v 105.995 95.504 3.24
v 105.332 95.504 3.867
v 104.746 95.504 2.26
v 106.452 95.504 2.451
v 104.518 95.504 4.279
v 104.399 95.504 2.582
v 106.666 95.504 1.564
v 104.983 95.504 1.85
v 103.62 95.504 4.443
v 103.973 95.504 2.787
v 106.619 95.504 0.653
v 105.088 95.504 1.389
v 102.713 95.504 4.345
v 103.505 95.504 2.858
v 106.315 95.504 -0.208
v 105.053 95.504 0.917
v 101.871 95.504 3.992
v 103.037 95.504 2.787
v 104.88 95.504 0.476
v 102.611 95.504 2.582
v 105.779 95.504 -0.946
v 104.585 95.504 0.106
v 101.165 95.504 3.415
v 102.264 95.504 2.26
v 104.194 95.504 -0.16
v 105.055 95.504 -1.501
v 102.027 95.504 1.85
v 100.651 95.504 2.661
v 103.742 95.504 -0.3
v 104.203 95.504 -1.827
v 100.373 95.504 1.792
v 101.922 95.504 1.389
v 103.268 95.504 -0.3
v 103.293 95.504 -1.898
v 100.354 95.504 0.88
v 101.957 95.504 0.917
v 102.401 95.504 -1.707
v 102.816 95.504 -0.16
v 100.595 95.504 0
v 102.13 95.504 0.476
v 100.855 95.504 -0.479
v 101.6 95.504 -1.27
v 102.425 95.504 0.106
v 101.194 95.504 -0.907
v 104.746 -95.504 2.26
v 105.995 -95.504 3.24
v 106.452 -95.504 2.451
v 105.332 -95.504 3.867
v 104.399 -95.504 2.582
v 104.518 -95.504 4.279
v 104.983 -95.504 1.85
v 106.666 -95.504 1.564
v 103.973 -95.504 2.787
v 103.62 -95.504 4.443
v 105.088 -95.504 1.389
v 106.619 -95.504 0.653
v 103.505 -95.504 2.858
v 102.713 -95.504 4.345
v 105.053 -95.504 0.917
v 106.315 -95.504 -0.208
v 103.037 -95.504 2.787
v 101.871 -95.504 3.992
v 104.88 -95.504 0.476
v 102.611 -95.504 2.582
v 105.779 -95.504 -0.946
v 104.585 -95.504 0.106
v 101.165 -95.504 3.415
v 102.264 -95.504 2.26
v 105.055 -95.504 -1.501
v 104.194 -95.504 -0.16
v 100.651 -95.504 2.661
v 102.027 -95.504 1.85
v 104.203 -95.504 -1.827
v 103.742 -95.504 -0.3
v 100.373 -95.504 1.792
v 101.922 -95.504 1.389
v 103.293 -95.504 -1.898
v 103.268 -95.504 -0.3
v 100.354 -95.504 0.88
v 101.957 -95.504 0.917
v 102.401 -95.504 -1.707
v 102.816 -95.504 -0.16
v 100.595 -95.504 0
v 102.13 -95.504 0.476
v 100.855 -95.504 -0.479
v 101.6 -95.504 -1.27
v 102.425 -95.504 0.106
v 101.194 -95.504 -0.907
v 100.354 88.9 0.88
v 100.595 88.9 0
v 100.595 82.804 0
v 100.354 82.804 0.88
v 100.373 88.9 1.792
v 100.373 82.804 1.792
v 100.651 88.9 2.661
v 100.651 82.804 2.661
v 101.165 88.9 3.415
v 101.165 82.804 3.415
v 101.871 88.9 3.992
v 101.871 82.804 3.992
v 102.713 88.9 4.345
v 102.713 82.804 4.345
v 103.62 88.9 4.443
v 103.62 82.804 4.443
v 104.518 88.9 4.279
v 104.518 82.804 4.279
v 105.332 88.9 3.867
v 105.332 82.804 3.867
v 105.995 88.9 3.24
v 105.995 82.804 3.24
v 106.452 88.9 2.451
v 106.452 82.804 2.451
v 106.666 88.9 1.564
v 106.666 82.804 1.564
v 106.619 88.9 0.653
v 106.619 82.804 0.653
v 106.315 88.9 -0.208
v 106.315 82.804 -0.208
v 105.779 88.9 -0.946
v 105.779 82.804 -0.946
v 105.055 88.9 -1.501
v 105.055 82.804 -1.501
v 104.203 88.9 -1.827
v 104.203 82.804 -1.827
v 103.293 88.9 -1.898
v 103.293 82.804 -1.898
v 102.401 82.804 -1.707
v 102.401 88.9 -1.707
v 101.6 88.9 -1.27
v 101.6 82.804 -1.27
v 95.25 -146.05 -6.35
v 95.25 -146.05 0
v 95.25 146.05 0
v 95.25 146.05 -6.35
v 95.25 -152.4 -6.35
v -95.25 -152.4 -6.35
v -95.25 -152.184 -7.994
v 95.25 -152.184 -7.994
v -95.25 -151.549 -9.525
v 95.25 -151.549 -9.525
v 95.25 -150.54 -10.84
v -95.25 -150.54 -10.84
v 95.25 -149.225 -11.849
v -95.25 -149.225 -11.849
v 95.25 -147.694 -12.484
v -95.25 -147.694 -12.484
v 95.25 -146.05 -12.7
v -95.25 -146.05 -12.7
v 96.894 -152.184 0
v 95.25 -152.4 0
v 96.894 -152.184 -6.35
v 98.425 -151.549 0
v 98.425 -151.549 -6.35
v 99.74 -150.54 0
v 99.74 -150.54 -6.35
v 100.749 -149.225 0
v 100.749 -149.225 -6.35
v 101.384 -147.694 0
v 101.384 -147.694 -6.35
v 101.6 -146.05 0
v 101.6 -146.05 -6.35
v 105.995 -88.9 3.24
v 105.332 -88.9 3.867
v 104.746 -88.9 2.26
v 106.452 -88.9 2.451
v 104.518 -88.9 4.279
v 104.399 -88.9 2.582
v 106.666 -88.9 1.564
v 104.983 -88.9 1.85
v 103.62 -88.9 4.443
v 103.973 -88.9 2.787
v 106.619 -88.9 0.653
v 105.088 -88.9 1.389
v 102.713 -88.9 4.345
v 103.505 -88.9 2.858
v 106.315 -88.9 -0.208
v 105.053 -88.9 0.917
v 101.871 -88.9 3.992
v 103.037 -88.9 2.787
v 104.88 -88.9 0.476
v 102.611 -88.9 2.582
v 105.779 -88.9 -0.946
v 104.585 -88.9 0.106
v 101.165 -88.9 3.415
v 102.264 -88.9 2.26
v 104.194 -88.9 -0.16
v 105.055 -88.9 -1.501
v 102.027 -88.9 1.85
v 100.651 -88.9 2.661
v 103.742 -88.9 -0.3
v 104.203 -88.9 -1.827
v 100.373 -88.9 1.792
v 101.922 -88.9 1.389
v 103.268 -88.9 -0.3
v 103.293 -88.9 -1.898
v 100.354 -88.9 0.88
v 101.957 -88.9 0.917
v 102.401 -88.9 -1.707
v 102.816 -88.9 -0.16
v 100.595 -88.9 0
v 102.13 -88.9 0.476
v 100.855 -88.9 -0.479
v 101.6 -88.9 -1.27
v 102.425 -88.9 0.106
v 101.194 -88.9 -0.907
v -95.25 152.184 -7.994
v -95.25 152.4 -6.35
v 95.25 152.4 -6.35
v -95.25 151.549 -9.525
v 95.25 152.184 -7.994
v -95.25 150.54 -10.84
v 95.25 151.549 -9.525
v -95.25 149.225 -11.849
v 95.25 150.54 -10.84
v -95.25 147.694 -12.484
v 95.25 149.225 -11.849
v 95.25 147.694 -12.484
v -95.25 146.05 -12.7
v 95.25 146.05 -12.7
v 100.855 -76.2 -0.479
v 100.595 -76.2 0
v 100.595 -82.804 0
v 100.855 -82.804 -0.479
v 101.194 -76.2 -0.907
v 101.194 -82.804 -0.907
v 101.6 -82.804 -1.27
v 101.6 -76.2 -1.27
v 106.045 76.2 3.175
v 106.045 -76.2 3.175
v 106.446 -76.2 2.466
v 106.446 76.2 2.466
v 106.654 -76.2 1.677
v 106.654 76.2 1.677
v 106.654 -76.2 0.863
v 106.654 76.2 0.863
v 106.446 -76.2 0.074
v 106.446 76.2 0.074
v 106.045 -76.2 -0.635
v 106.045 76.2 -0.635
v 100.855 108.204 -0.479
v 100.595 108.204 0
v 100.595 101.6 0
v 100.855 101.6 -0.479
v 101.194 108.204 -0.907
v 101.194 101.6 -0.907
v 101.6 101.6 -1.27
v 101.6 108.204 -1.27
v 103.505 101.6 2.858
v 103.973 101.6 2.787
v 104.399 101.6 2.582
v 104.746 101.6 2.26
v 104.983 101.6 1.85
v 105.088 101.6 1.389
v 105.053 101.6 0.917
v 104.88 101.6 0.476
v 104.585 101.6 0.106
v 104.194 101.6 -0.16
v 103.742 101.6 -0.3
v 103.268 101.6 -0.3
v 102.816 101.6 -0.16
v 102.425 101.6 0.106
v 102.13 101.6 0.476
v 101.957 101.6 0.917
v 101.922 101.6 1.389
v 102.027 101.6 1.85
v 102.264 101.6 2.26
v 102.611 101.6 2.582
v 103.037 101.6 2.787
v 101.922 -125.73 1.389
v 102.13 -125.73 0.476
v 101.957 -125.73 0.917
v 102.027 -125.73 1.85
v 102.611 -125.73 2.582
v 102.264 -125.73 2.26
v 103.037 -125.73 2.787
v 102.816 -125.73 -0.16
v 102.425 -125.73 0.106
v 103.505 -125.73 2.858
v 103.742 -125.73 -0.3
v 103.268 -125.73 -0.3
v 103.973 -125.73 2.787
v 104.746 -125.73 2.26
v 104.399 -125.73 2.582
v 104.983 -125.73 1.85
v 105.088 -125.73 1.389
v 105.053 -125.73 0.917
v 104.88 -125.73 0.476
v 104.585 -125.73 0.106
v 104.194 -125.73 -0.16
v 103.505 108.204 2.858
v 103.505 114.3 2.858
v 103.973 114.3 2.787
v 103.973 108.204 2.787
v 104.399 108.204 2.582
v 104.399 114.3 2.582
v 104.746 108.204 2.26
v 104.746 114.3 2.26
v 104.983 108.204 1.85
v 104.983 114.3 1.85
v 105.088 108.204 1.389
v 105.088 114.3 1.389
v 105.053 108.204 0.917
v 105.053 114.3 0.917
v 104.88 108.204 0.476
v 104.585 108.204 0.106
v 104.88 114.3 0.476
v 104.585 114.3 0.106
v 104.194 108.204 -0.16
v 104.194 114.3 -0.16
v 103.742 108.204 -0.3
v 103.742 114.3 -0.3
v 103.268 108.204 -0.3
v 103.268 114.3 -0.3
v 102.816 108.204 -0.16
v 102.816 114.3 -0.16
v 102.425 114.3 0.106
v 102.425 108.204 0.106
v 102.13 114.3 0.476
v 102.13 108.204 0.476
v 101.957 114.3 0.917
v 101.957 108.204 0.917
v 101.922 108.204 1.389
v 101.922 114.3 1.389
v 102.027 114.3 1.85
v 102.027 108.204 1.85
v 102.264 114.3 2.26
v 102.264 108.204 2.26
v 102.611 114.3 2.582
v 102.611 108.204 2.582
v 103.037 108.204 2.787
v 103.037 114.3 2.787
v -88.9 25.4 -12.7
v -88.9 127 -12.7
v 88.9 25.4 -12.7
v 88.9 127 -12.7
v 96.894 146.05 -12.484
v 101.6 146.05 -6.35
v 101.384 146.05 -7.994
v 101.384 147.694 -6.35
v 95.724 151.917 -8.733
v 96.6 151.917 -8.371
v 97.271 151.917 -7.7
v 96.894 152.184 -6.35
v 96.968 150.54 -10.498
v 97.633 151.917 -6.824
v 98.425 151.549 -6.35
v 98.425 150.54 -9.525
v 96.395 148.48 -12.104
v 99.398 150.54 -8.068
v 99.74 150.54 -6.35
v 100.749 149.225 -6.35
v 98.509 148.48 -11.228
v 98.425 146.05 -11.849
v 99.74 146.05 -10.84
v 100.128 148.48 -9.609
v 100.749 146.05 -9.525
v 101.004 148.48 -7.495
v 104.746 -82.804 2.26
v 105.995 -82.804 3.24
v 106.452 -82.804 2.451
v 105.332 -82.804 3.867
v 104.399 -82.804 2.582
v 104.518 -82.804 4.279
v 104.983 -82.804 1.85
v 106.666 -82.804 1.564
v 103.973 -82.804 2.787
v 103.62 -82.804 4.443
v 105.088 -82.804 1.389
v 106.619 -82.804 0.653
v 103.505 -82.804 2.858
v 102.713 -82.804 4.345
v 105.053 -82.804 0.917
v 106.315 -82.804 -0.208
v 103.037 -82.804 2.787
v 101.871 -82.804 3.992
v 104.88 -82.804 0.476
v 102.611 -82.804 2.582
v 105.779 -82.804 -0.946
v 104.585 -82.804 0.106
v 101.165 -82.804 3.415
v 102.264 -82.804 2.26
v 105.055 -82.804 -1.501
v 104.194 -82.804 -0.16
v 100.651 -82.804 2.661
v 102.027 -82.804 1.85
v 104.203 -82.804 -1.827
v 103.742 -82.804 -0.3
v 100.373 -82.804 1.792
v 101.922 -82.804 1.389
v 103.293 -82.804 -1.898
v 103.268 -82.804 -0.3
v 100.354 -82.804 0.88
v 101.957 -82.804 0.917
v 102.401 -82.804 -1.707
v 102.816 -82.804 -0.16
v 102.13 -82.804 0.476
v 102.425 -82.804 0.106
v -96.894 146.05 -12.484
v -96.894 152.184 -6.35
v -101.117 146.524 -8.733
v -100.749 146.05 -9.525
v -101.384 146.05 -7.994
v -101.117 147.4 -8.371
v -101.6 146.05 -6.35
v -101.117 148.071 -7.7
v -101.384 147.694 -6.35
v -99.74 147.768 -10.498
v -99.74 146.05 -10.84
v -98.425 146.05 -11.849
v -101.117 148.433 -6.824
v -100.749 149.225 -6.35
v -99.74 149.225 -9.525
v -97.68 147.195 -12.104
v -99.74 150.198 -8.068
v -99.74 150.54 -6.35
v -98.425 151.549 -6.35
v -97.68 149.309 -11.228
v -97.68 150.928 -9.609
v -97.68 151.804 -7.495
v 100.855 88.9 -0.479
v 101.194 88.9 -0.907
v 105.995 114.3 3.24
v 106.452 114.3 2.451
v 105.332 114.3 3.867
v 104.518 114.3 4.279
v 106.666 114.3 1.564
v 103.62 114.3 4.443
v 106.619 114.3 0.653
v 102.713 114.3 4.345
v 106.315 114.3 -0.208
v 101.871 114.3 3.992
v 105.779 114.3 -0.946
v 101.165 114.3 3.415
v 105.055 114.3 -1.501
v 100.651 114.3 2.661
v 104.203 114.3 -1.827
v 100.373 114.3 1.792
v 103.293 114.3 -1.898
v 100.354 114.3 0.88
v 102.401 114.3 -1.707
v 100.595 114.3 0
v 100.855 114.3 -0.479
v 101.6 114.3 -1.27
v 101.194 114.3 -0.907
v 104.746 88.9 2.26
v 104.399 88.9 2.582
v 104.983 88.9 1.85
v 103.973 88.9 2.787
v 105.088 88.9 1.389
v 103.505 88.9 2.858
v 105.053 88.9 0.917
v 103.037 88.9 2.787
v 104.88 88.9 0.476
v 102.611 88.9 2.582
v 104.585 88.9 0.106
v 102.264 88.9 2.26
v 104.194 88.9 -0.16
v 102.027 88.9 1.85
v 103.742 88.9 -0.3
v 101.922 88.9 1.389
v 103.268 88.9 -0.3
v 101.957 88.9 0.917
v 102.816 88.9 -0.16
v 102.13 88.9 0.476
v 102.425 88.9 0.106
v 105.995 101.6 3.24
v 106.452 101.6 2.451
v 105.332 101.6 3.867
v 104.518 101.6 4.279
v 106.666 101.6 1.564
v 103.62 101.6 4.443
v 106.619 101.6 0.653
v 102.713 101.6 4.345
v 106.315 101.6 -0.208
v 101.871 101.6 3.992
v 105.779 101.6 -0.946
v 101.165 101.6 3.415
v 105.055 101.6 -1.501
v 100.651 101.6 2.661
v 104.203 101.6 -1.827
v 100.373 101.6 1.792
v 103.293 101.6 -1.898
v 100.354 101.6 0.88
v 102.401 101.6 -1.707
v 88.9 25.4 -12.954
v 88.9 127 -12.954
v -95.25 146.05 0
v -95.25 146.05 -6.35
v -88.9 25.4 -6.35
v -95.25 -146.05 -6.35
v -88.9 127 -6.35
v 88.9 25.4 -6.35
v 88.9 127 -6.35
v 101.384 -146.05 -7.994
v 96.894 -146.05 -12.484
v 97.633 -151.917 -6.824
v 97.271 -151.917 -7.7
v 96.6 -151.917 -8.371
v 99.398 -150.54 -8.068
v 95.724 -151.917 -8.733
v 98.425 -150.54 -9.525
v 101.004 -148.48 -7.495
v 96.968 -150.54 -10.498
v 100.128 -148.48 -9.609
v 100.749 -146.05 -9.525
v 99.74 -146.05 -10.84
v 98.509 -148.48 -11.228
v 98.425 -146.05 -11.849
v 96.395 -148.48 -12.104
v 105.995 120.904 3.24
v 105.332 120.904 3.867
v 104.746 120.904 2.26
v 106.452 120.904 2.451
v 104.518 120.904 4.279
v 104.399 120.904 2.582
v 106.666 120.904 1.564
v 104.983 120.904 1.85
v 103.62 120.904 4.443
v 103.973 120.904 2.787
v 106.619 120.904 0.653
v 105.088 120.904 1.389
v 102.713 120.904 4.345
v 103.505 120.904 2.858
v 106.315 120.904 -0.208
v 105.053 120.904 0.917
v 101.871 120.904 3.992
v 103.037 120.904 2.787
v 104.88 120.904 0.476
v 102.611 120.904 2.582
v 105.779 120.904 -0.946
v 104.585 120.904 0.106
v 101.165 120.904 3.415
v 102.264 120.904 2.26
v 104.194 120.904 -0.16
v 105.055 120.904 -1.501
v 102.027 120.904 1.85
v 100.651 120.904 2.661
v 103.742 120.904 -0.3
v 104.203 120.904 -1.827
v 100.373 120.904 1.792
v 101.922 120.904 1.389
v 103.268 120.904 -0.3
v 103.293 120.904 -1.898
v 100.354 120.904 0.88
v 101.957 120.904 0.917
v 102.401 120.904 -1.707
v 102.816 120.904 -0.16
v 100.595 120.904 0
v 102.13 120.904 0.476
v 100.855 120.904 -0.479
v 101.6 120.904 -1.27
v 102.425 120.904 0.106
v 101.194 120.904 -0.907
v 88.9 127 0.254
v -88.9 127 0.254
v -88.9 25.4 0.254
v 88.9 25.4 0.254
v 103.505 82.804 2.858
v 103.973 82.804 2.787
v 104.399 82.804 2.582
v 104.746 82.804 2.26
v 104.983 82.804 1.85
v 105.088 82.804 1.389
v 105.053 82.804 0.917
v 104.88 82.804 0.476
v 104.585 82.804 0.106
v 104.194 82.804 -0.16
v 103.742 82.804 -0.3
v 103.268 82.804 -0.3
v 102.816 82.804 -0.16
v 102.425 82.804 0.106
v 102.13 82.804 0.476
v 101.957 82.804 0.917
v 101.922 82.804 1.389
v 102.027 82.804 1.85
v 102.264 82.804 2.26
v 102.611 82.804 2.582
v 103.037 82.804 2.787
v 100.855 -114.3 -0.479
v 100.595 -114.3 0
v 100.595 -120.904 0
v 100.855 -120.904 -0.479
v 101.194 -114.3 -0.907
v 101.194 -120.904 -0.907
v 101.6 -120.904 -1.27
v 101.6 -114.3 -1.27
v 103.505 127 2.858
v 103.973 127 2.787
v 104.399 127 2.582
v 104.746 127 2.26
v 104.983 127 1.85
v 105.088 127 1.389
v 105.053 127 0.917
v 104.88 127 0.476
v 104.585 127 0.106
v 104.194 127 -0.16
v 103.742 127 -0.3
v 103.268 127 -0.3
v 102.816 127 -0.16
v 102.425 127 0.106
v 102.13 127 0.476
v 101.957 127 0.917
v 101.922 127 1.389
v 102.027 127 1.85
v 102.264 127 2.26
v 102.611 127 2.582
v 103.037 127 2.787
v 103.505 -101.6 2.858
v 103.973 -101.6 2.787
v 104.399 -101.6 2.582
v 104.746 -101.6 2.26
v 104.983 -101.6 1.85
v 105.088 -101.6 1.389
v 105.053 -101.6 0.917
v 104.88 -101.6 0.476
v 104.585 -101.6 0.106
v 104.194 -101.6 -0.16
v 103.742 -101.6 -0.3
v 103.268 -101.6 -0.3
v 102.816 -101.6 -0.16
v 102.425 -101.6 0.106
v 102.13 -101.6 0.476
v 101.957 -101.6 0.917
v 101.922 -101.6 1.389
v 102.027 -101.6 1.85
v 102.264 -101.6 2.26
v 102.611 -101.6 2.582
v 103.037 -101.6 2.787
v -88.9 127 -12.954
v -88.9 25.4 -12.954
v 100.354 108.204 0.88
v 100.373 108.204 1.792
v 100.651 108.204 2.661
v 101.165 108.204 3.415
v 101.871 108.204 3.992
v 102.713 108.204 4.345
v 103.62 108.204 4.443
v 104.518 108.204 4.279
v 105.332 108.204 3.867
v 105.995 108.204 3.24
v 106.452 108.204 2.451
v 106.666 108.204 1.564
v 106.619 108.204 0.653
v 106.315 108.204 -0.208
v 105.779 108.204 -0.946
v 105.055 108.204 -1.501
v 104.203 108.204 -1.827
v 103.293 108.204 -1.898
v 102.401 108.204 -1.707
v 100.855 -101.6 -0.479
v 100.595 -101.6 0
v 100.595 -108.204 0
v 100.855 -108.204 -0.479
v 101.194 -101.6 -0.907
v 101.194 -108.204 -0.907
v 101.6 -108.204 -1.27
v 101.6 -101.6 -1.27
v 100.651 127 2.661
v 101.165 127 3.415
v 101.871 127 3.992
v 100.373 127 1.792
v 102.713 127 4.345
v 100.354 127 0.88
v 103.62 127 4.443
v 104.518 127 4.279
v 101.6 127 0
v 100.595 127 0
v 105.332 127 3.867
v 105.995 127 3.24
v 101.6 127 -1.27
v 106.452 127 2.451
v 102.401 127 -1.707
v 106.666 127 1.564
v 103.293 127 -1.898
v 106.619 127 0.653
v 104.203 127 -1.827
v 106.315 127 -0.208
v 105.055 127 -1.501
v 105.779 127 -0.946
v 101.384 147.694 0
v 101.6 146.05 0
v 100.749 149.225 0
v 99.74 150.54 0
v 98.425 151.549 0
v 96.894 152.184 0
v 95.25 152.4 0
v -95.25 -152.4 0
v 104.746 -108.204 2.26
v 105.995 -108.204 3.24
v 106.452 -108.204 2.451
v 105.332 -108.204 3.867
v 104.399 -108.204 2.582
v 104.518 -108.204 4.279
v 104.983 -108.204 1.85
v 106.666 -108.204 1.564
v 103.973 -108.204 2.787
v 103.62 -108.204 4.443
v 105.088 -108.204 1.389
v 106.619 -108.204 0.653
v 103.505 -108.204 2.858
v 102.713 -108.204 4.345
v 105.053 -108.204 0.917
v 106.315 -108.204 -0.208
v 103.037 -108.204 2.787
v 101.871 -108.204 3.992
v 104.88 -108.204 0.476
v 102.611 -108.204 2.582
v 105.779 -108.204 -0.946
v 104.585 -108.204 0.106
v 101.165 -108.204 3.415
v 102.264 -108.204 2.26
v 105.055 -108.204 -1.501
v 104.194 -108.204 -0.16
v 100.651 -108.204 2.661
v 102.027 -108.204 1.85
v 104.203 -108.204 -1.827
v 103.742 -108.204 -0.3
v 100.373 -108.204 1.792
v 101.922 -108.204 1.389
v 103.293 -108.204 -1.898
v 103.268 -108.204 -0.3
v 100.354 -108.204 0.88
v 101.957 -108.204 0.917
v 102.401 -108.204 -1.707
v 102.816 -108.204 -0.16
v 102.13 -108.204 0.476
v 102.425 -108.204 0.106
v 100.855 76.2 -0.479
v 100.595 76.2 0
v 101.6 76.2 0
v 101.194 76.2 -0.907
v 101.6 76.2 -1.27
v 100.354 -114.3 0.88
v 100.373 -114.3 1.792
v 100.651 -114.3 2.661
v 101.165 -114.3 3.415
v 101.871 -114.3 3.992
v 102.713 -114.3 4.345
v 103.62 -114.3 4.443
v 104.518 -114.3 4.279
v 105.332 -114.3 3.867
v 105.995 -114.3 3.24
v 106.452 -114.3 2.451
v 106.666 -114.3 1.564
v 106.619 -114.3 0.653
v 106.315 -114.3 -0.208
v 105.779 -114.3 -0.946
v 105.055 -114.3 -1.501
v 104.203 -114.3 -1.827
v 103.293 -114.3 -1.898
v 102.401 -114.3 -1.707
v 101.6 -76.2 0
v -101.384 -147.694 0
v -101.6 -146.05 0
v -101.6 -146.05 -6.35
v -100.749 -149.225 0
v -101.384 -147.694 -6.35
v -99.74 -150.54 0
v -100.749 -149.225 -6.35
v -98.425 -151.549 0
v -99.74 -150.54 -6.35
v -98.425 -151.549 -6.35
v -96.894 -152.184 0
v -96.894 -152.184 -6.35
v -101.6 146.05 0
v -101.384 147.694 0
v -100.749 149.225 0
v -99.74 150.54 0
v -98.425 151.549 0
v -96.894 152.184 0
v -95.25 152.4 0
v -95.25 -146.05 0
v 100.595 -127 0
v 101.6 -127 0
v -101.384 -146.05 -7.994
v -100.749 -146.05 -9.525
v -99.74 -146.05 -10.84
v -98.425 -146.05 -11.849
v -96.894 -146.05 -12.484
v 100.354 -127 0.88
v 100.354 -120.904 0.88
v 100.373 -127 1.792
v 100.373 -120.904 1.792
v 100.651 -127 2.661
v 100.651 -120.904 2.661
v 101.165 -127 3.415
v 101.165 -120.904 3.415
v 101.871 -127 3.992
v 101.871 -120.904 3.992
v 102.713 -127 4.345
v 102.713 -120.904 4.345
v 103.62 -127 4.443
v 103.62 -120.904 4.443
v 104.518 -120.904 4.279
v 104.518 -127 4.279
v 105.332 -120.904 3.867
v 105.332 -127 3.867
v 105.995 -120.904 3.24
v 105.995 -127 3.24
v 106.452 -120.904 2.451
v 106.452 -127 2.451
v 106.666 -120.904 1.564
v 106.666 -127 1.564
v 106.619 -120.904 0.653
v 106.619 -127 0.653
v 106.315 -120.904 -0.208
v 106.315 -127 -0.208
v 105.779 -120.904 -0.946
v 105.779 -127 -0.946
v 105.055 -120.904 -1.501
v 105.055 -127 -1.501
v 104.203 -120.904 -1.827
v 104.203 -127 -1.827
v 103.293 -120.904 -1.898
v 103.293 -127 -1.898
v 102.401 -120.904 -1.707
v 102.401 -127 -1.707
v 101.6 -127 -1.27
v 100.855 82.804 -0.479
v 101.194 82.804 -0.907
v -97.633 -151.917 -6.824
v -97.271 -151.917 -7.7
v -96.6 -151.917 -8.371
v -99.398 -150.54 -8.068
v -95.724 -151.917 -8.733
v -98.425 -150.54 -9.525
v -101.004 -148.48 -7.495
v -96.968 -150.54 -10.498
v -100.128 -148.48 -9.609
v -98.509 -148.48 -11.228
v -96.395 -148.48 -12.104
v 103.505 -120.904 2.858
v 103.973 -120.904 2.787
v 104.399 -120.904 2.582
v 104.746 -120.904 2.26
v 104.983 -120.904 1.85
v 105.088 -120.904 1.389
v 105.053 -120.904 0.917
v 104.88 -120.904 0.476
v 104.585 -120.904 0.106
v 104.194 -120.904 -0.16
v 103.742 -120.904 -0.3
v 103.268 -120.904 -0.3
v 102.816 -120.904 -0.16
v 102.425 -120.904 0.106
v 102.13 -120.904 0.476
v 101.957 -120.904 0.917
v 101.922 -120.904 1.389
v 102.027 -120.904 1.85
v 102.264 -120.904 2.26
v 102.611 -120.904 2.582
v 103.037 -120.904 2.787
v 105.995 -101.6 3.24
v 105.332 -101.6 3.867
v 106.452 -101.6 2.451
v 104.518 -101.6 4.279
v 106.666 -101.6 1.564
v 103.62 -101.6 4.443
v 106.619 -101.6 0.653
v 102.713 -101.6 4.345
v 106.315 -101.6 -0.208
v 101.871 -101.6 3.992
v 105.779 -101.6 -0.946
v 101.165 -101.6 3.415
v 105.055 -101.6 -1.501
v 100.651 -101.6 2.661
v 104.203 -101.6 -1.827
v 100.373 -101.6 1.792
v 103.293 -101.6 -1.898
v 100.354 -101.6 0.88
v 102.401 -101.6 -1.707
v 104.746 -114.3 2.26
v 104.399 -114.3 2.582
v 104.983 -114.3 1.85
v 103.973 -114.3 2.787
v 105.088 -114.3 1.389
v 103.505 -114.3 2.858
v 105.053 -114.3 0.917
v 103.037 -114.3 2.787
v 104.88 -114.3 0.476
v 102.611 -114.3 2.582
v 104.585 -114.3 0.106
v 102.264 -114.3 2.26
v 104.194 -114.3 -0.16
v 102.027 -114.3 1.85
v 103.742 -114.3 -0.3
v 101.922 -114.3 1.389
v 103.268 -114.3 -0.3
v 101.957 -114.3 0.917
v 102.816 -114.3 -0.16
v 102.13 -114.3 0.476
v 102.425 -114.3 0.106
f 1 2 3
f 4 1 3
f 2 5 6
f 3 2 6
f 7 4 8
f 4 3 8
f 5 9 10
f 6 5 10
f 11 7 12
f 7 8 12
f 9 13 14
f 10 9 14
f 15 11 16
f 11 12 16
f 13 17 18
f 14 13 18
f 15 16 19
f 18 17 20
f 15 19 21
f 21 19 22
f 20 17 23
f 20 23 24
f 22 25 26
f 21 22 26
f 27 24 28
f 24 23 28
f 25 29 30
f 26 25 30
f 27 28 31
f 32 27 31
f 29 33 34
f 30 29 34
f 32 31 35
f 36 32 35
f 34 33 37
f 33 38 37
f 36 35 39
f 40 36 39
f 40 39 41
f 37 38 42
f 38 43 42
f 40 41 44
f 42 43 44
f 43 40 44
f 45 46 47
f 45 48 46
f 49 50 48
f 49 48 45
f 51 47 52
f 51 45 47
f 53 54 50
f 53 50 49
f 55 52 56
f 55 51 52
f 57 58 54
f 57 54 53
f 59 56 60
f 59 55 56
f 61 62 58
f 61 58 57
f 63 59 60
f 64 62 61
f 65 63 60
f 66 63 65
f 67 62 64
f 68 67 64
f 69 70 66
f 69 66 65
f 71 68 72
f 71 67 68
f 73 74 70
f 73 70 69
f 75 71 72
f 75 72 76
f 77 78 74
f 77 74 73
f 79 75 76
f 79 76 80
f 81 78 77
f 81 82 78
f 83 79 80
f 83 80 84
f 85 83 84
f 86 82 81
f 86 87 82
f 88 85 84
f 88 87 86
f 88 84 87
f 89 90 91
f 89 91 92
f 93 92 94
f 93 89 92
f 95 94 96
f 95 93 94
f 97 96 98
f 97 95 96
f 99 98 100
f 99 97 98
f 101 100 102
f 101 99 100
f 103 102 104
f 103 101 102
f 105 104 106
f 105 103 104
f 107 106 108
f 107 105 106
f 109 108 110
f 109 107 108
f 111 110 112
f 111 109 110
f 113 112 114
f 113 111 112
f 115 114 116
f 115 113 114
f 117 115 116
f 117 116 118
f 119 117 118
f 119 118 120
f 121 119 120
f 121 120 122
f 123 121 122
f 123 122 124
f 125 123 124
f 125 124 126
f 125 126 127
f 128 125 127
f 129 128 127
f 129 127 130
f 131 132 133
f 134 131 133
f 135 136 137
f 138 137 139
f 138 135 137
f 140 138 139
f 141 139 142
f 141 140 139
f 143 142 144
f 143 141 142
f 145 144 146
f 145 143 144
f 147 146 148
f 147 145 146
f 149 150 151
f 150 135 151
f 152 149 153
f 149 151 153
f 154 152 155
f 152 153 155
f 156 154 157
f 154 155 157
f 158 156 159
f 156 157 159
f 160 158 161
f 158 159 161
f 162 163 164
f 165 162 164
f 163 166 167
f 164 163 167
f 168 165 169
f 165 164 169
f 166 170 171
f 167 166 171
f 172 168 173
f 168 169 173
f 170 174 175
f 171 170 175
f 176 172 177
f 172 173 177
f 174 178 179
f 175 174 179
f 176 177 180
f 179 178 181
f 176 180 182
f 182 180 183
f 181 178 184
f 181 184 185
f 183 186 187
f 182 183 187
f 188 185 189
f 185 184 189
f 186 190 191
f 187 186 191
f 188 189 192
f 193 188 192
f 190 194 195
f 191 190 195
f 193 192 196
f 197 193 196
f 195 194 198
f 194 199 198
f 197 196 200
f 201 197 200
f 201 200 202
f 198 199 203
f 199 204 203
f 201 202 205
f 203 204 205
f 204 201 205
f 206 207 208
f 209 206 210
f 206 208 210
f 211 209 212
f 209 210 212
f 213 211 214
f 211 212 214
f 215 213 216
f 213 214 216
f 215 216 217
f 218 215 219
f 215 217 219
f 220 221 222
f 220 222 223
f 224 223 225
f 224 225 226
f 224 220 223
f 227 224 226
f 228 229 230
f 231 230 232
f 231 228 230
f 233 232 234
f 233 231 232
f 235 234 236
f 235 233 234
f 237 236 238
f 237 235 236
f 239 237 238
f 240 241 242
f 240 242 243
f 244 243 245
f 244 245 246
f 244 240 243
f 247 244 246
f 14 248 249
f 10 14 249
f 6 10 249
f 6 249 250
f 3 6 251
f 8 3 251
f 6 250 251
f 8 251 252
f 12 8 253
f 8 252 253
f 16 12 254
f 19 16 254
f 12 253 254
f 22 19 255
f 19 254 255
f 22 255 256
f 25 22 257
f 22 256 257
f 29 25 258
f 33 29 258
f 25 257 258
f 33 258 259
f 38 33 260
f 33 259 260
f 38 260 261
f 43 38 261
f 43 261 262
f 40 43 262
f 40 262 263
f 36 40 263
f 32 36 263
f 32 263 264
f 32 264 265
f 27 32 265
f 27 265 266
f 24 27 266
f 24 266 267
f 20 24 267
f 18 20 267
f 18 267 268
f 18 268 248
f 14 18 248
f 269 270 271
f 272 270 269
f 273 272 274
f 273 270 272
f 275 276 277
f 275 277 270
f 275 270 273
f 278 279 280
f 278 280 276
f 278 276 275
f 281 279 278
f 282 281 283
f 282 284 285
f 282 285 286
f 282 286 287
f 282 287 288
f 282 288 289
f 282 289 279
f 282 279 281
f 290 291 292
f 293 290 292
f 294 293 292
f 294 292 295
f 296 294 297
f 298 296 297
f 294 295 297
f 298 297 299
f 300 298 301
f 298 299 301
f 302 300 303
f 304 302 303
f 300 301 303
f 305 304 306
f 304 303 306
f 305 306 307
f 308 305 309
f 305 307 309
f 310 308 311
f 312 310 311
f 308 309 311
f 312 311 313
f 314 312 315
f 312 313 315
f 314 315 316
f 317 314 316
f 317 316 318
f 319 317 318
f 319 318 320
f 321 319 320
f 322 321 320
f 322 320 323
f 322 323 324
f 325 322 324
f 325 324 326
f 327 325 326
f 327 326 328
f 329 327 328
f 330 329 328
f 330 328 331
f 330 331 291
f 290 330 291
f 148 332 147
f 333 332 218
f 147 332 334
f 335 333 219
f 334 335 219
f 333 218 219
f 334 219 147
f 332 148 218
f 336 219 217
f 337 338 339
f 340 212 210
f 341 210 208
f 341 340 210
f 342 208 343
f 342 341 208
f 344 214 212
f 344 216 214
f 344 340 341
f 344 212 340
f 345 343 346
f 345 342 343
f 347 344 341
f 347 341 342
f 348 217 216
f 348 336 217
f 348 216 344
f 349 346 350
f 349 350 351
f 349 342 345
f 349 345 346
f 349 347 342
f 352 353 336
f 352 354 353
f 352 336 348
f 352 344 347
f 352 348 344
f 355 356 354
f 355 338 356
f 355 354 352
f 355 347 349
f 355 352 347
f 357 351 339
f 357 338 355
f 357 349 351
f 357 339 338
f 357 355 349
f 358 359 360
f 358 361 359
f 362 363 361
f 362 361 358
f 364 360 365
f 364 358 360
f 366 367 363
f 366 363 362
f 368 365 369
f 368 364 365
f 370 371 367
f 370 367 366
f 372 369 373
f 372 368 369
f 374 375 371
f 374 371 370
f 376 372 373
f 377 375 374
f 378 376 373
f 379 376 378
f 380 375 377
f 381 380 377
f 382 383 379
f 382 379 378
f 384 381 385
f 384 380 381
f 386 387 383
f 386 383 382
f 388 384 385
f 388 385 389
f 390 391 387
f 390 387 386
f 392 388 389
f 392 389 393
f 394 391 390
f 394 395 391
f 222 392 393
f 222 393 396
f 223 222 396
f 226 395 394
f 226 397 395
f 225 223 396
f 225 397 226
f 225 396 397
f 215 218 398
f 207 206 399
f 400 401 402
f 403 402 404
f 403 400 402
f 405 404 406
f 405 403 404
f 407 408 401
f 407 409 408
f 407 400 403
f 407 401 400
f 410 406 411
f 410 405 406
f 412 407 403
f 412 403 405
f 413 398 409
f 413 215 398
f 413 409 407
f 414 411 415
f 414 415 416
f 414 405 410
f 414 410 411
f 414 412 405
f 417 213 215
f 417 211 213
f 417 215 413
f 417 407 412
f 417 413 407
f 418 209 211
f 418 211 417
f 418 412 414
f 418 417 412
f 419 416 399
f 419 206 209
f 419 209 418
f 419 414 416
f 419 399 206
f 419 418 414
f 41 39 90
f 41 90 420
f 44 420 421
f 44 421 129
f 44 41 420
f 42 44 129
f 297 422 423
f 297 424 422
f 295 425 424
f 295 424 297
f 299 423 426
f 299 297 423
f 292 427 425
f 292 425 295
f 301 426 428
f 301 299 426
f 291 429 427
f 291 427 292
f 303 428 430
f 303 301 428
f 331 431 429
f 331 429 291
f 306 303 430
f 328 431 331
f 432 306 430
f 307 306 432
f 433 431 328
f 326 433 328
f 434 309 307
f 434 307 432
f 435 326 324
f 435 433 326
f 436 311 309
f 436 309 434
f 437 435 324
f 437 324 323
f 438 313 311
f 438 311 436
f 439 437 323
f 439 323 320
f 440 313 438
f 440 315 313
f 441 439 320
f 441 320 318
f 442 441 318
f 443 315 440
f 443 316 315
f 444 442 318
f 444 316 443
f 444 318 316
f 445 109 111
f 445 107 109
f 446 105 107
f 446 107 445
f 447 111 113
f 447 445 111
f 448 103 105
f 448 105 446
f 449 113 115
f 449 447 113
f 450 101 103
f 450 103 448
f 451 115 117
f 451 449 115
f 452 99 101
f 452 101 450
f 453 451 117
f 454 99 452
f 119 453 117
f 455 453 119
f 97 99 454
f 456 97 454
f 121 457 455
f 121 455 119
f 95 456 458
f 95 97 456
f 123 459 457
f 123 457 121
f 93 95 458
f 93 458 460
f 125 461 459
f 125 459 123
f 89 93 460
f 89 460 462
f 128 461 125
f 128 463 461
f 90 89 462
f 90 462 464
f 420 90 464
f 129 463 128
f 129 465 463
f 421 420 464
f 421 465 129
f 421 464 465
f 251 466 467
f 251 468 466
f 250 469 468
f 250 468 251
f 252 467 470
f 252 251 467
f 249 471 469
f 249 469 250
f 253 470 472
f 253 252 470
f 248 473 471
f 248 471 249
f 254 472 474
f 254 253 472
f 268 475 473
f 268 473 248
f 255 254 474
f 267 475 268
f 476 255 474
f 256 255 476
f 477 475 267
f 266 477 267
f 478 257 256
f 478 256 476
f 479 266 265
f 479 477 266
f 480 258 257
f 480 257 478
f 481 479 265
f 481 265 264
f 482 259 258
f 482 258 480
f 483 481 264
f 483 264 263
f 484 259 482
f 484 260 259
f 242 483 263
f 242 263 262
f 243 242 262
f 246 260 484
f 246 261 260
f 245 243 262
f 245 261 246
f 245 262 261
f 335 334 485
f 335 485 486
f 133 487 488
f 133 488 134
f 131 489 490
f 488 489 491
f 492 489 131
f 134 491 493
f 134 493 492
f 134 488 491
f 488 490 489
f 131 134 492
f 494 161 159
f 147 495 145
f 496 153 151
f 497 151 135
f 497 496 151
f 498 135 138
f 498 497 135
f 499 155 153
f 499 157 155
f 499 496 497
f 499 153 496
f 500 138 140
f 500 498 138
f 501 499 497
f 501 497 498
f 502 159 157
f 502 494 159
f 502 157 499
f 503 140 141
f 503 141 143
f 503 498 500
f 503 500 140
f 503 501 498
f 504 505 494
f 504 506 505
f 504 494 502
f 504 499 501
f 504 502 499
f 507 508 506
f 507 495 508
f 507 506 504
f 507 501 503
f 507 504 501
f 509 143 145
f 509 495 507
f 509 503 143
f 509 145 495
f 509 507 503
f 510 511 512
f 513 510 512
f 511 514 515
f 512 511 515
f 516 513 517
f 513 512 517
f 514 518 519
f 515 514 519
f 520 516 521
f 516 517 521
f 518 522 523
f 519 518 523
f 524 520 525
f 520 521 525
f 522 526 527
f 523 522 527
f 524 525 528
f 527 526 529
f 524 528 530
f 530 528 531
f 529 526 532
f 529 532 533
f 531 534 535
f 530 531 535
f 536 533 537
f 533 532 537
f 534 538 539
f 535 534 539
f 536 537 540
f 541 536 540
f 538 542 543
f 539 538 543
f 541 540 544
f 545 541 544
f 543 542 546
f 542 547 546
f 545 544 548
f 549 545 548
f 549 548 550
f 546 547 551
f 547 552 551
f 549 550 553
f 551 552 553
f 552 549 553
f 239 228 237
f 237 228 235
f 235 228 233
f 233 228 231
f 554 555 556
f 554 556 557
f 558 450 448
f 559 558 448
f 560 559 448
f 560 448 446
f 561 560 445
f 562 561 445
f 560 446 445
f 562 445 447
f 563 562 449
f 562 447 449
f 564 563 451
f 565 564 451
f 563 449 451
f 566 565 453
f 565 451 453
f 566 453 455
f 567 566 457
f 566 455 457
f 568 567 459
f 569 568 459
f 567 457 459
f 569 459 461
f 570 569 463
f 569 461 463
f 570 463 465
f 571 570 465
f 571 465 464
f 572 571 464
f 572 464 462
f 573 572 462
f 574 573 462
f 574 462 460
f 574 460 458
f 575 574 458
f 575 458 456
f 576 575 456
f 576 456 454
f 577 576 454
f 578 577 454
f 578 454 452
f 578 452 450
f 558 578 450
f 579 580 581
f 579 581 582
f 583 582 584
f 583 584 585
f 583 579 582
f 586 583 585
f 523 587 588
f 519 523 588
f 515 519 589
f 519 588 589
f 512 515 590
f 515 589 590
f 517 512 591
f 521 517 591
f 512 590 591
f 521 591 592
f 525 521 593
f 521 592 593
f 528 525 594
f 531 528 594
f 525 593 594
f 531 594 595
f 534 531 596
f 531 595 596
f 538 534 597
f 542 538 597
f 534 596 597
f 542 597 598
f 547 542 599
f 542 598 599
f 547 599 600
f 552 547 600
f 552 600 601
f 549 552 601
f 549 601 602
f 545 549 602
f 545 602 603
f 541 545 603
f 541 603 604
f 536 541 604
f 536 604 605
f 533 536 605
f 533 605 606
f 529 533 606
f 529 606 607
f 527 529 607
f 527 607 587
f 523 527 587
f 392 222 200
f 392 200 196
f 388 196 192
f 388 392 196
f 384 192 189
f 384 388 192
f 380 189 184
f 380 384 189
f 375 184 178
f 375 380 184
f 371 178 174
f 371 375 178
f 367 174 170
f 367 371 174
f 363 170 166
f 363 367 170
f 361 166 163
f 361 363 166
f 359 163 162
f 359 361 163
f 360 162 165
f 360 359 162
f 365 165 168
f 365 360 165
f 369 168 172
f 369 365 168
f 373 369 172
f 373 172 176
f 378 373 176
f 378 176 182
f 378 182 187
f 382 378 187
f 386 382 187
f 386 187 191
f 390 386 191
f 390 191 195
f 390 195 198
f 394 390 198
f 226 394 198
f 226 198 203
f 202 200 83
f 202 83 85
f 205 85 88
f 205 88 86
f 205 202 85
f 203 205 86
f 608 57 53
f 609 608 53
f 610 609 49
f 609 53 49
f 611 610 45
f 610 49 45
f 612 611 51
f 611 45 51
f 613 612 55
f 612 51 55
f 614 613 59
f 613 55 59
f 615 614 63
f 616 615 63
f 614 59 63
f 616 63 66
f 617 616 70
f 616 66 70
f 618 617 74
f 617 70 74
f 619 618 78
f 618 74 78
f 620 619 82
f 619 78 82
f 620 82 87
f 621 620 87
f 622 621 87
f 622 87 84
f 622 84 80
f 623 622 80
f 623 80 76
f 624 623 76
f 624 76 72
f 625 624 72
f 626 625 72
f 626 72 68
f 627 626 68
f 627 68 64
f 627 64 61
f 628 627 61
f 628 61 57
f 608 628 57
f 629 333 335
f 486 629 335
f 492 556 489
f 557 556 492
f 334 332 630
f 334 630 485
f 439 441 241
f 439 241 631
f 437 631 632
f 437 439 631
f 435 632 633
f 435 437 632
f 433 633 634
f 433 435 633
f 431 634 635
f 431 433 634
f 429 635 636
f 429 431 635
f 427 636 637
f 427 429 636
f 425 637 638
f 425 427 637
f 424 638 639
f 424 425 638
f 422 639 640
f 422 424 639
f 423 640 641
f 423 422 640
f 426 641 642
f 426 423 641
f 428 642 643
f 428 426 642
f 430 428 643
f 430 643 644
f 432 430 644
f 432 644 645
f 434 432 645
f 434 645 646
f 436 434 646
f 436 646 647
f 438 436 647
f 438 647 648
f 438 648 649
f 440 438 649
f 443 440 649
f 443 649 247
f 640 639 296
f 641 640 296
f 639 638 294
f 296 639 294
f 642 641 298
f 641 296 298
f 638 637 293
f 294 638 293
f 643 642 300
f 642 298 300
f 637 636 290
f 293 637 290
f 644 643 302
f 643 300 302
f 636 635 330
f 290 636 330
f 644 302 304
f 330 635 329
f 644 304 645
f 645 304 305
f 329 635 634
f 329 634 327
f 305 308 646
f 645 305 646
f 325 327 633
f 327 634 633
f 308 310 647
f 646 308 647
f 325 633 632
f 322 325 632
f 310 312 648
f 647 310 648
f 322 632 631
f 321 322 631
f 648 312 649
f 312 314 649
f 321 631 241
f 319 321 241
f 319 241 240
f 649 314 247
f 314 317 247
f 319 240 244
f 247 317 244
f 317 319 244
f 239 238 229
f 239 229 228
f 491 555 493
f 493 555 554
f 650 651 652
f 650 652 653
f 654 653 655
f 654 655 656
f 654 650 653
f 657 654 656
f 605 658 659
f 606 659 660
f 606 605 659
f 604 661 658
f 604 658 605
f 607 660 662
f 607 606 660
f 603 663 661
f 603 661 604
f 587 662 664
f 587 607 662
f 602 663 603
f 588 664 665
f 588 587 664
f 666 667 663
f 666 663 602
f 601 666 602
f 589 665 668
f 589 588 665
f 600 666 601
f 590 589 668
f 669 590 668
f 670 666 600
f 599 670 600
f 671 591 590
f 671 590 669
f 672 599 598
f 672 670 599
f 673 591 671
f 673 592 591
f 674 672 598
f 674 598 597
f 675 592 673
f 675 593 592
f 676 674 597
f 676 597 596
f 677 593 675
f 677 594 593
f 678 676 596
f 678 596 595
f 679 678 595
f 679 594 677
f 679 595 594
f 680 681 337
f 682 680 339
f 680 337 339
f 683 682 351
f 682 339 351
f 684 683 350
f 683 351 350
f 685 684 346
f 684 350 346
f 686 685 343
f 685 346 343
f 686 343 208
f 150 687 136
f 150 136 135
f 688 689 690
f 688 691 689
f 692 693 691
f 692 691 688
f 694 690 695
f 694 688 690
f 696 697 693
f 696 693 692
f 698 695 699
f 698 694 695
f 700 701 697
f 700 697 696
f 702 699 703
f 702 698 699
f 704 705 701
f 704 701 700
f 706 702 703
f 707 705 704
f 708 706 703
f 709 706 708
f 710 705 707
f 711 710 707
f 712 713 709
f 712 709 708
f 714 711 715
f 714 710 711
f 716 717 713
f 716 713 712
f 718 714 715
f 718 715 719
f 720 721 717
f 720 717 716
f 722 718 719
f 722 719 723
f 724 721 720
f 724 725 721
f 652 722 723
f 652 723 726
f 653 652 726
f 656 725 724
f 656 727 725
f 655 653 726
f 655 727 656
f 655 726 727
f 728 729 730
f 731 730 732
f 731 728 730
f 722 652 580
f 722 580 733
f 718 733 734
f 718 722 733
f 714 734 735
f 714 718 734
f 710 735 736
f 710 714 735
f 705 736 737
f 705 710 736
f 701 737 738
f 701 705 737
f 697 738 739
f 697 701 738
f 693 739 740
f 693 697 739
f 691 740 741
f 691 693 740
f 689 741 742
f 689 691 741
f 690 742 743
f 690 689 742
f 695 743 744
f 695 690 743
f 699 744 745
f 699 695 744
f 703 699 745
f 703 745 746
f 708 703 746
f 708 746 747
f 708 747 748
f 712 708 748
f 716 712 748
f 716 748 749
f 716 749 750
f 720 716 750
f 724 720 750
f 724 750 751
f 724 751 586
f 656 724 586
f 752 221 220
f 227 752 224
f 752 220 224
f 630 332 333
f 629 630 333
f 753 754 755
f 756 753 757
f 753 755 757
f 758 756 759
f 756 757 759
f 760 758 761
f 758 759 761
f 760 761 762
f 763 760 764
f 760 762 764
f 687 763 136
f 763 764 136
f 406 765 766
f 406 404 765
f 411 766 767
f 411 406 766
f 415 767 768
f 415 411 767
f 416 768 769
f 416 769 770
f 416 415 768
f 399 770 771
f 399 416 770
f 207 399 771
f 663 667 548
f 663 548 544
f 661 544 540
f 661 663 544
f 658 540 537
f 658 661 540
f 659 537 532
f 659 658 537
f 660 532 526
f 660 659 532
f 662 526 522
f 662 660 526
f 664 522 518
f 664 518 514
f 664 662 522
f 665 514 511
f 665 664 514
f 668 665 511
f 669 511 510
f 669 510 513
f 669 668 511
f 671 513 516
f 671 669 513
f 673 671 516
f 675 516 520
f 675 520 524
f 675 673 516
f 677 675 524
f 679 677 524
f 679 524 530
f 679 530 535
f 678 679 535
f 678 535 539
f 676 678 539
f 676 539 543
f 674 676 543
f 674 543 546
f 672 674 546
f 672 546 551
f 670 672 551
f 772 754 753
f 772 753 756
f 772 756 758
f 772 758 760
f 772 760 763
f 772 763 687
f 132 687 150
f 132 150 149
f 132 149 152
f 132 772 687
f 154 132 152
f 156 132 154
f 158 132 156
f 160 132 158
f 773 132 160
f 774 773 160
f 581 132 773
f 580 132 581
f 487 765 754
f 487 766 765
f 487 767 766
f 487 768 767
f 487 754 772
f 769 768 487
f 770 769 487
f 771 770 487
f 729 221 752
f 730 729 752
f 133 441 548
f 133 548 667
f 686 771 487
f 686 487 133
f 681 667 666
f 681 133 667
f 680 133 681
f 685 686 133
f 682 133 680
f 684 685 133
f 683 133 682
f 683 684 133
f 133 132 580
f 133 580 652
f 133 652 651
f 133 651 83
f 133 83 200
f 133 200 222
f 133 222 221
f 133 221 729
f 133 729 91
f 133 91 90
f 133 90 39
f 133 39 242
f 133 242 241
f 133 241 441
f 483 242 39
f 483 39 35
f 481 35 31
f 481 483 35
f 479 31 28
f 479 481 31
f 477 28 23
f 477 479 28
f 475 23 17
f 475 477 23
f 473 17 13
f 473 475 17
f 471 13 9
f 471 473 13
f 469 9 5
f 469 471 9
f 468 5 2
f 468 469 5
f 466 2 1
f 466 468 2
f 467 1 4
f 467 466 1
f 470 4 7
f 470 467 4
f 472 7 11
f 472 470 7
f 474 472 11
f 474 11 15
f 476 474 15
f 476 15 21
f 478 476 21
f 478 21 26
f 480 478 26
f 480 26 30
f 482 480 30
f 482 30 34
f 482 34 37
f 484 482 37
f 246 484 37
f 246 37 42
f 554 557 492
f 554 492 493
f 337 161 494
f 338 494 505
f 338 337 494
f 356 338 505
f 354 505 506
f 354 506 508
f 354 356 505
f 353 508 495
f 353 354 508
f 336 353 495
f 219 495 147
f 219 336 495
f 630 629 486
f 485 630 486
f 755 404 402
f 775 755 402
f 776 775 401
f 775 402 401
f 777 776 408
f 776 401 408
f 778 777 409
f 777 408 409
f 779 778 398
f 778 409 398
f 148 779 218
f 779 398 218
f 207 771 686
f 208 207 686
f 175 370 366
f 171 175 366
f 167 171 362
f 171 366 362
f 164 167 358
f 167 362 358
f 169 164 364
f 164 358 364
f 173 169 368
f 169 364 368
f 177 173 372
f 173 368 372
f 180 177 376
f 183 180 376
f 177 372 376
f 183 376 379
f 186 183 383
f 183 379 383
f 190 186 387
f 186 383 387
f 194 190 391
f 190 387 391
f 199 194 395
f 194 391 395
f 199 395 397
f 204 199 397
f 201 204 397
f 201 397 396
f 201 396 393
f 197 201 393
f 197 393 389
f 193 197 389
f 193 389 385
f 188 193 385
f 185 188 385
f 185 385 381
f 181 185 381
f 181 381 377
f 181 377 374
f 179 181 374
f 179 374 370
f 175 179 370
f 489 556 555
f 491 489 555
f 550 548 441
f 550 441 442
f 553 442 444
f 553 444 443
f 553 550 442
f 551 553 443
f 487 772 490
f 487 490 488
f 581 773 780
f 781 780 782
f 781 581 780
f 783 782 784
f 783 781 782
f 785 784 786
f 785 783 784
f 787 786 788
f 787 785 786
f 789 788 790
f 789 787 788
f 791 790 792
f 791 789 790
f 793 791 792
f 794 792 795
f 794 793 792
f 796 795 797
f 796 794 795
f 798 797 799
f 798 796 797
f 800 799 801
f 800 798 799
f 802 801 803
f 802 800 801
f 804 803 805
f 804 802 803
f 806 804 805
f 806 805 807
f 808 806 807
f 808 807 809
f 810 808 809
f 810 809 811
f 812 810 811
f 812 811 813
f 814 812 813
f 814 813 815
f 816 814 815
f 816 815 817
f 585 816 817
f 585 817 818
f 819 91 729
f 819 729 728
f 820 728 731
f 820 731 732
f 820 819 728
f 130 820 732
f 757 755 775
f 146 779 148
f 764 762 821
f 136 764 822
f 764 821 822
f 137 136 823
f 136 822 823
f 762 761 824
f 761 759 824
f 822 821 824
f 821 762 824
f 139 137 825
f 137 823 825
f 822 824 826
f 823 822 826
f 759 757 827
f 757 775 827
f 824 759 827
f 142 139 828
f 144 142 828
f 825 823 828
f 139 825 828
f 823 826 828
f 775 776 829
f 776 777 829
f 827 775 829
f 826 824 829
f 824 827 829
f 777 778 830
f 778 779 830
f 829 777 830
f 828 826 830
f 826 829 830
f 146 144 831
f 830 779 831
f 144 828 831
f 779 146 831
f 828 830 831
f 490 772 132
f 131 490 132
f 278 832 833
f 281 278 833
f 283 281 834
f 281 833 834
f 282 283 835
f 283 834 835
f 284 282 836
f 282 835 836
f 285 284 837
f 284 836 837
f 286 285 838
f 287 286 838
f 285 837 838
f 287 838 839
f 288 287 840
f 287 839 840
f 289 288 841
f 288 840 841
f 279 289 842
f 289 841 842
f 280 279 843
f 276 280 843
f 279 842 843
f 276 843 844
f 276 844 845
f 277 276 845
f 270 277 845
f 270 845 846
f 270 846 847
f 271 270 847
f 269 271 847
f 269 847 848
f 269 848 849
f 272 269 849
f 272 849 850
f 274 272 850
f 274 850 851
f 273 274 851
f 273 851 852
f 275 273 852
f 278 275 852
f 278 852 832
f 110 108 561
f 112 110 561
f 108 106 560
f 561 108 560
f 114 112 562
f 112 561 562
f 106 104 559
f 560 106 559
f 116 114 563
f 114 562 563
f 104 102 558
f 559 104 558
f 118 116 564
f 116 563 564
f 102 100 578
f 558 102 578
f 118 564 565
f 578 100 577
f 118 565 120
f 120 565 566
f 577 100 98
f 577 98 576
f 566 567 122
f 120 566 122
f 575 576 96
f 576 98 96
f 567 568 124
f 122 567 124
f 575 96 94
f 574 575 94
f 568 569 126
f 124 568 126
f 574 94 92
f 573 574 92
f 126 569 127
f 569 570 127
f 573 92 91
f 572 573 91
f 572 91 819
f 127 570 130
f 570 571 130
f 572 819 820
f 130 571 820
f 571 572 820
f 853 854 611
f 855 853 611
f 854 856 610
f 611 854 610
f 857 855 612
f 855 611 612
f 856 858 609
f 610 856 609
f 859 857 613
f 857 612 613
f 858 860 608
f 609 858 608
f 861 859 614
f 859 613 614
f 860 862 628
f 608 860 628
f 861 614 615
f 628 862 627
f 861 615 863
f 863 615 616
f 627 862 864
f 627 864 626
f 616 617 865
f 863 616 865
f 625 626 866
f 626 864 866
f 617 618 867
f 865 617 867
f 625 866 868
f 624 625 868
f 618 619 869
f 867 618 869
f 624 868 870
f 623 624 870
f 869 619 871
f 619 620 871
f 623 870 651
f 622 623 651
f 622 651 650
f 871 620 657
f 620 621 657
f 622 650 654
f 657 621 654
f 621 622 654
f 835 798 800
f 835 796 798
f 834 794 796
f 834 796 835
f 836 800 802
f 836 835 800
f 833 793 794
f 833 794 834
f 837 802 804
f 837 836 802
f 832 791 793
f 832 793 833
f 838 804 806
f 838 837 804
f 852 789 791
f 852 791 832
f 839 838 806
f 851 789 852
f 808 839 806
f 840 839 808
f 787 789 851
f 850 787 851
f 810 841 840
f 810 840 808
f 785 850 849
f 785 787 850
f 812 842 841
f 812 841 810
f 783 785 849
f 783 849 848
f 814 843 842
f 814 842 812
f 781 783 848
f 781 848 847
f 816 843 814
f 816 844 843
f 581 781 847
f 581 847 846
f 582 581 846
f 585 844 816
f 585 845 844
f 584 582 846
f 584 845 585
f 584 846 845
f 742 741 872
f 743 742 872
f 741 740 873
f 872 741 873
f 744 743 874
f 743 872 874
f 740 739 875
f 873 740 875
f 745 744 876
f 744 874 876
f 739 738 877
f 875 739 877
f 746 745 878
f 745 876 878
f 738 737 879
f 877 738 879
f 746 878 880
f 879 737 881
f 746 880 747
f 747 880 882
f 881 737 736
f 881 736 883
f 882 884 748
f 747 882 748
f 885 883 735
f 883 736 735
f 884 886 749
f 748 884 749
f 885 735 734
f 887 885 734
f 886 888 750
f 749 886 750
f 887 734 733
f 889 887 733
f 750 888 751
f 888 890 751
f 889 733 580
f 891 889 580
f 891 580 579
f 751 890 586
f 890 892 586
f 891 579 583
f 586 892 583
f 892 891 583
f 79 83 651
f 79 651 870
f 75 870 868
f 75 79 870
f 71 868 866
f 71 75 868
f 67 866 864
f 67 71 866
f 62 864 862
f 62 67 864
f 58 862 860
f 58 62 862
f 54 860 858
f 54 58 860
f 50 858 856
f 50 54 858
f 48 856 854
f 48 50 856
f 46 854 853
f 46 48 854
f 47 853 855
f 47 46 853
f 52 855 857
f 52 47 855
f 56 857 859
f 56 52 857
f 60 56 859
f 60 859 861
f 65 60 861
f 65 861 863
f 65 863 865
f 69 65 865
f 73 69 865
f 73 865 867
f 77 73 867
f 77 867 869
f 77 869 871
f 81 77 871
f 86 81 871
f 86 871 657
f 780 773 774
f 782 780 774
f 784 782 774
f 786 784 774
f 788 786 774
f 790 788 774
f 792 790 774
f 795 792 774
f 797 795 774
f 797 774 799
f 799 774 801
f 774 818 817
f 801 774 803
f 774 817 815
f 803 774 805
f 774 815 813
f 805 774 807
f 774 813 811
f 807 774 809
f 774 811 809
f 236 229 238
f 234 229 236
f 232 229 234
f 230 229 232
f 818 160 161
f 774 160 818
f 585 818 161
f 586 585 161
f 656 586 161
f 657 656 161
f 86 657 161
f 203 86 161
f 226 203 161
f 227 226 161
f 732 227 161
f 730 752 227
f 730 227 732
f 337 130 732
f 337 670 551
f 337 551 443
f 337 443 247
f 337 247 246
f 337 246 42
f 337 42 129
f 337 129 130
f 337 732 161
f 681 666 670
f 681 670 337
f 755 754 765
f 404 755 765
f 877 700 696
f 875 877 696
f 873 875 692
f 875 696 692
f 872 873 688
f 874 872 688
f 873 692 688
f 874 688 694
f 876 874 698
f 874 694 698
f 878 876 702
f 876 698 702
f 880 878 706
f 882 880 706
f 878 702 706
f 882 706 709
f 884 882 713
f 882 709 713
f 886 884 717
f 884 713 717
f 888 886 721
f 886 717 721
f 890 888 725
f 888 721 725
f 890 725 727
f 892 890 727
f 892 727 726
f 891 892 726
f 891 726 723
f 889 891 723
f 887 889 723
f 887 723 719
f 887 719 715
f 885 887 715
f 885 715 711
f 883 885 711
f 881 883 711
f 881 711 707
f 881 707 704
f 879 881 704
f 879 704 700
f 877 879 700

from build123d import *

# Parameters (mm, degrees)
SKETCH1_W                = 203.2
SKETCH1_H                = 304.8
BOSS_EXTRUDE1_DEPTH      = 12.7
FILLET1_R                = 6.35
SKETCH2_W                = 190.5
SKETCH2_H                = 292.1
CUT_EXTRUDE1_DEPTH       = 6.35
SKETCH3_R                = 3.175
BOSS_EXTRUDE3_DEPTH      = 127
SKETCH14_R               = 1.5875
CUT_EXTRUDE9_DEPTH       = 252.73
SKETCH6_W                = 3.175
SKETCH6_H                = 6.604
CUT_EXTRUDE14_DEPTH      = 187.551717494
CUT_EXTRUDE14_DEPTH_BACK = 187.551717494
SKETCH21_W               = 4.445
SKETCH21_H               = 152.4
CUT_EXTRUDE15_DEPTH      = 187.460913867
CUT_EXTRUDE15_DEPTH_BACK = 187.460913867
SKETCH22_W               = 3.81
SKETCH22_H               = 152.4
SKETCH24_W               = 177.8
SKETCH24_H               = 101.6
BOSS_EXTRUDE5_DEPTH      = 6.604


with BuildPart() as part:
    # Sketch1 → Boss-Extrude1 (new body)
    with BuildSketch(Plane.XY):
        Rectangle(SKETCH1_W, SKETCH1_H)
    extrude(amount=-BOSS_EXTRUDE1_DEPTH)

    # Fillet1
    fillet1_edges = [part.edges().sort_by_distance(p)[0] for p in [
        (101.6, 0, -12.7),
        (0, 152.4, -12.7),
        (-101.6, 0, -12.7),
        (-101.6, 152.4, -6.35),
        (101.6, 152.4, -6.35),
        (101.6, -152.4, -6.35),
        (-101.6, -152.4, -6.35),
        (0, -152.4, -12.7),
    ]]
    fillet(fillet1_edges, radius=FILLET1_R)

    # Sketch2 → Cut-Extrude1 (cut)
    with BuildSketch(Plane.XY):
        Rectangle(SKETCH2_W, SKETCH2_H)
    extrude(amount=-CUT_EXTRUDE1_DEPTH, mode=Mode.SUBTRACT)

    # Sketch3 → Boss-Extrude3 (add, symmetric)
    with BuildSketch(Plane(origin=(0, 0, 0), x_dir=(1, 0, 0), z_dir=(0, 1, 0))):
        with Locations((103.505, -1.27)):
            Circle(SKETCH3_R)
    extrude(amount=BOSS_EXTRUDE3_DEPTH, both=True)

    # Sketch14 → Cut-Extrude9 (cut)
    with BuildSketch(Plane(origin=(0, 127, 0), x_dir=(1, 0, 0), z_dir=(0, 1, 0))):
        with Locations(Location((103.505, -1.27, 0), (0, 0, 270))):
            Circle(SKETCH14_R)
    extrude(amount=-CUT_EXTRUDE9_DEPTH, mode=Mode.SUBTRACT)

    # Sketch6 → Cut-Revolve1 (revolve, cut)
    with BuildSketch(Plane.XY.offset(1.27), mode=Mode.PRIVATE) as cut_revolve1_sk:
        with Locations((105.0925, 117.602)):
            Rectangle(SKETCH6_W, SKETCH6_H)
        with Locations((105.0925, -92.202)):
            Rectangle(SKETCH6_W, SKETCH6_H)
        with Locations((105.0925, 104.902)):
            Rectangle(SKETCH6_W, SKETCH6_H)
        with Locations((105.0925, 92.202)):
            Rectangle(SKETCH6_W, SKETCH6_H)
        with Locations((105.0925, -117.602)):
            Rectangle(SKETCH6_W, SKETCH6_H)
        with Locations((105.0925, -104.902)):
            Rectangle(SKETCH6_W, SKETCH6_H)
        with Locations((105.0925, -79.502)):
            Rectangle(SKETCH6_W, SKETCH6_H)
        with Locations((105.0925, 79.502)):
            Rectangle(SKETCH6_W, SKETCH6_H)
    revolve(cut_revolve1_sk.sketch.rotate(Axis((103.505, 132.703354679, 1.27), (0, -1, 0)), 90), axis=Axis((103.505, 132.703354679, 1.27), (0, -1, 0)), mode=Mode.SUBTRACT)

    # Sketch21 → Cut-Extrude14 (cut, two sides: drawn at the far end of the back side and taken through both)
    with BuildSketch(Plane.XY.offset(1.27).offset(-CUT_EXTRUDE14_DEPTH_BACK)):
        with Locations((103.8225, 0)):
            Rectangle(SKETCH21_W, SKETCH21_H)
    extrude(amount=CUT_EXTRUDE14_DEPTH + CUT_EXTRUDE14_DEPTH_BACK, mode=Mode.SUBTRACT)


with BuildPart() as cut_extrude14_piece_1:
    # of the separate pieces the step leaves, piece 1, a body of its own (cut_extrude14_pieces)
    add(part.part.solids().sort_by_distance((95.25, -152.4, 0))[0])

    # Sketch22 → Cut-Extrude15 (cut, two sides: drawn at the far end of the back side and taken through both)
    with BuildSketch(Plane(origin=(0, 0, 0), x_dir=(0, 0, -1), z_dir=(1, 0, 0)).offset(-CUT_EXTRUDE15_DEPTH_BACK)):
        with Locations((-1.905, 0)):
            Rectangle(SKETCH22_W, SKETCH22_H)
    extrude(amount=CUT_EXTRUDE15_DEPTH + CUT_EXTRUDE15_DEPTH_BACK, mode=Mode.SUBTRACT)

    # Sketch24 → Boss-Extrude5 (add, symmetric)
    with BuildSketch(Plane.XY.offset(-6.35)):
        with Locations((0, 76.2)):
            Rectangle(SKETCH24_W, SKETCH24_H)
    extrude(amount=BOSS_EXTRUDE5_DEPTH, both=True)


with BuildPart() as cut_extrude14_piece_2:
    # of the separate pieces the step leaves, piece 2, a body of its own (cut_extrude14_pieces)
    add(part.part.solids().sort_by_distance((106.045, -76.2, 3.175))[0])


solid = Compound([cut_extrude14_piece_1.part, cut_extrude14_piece_2.part])
